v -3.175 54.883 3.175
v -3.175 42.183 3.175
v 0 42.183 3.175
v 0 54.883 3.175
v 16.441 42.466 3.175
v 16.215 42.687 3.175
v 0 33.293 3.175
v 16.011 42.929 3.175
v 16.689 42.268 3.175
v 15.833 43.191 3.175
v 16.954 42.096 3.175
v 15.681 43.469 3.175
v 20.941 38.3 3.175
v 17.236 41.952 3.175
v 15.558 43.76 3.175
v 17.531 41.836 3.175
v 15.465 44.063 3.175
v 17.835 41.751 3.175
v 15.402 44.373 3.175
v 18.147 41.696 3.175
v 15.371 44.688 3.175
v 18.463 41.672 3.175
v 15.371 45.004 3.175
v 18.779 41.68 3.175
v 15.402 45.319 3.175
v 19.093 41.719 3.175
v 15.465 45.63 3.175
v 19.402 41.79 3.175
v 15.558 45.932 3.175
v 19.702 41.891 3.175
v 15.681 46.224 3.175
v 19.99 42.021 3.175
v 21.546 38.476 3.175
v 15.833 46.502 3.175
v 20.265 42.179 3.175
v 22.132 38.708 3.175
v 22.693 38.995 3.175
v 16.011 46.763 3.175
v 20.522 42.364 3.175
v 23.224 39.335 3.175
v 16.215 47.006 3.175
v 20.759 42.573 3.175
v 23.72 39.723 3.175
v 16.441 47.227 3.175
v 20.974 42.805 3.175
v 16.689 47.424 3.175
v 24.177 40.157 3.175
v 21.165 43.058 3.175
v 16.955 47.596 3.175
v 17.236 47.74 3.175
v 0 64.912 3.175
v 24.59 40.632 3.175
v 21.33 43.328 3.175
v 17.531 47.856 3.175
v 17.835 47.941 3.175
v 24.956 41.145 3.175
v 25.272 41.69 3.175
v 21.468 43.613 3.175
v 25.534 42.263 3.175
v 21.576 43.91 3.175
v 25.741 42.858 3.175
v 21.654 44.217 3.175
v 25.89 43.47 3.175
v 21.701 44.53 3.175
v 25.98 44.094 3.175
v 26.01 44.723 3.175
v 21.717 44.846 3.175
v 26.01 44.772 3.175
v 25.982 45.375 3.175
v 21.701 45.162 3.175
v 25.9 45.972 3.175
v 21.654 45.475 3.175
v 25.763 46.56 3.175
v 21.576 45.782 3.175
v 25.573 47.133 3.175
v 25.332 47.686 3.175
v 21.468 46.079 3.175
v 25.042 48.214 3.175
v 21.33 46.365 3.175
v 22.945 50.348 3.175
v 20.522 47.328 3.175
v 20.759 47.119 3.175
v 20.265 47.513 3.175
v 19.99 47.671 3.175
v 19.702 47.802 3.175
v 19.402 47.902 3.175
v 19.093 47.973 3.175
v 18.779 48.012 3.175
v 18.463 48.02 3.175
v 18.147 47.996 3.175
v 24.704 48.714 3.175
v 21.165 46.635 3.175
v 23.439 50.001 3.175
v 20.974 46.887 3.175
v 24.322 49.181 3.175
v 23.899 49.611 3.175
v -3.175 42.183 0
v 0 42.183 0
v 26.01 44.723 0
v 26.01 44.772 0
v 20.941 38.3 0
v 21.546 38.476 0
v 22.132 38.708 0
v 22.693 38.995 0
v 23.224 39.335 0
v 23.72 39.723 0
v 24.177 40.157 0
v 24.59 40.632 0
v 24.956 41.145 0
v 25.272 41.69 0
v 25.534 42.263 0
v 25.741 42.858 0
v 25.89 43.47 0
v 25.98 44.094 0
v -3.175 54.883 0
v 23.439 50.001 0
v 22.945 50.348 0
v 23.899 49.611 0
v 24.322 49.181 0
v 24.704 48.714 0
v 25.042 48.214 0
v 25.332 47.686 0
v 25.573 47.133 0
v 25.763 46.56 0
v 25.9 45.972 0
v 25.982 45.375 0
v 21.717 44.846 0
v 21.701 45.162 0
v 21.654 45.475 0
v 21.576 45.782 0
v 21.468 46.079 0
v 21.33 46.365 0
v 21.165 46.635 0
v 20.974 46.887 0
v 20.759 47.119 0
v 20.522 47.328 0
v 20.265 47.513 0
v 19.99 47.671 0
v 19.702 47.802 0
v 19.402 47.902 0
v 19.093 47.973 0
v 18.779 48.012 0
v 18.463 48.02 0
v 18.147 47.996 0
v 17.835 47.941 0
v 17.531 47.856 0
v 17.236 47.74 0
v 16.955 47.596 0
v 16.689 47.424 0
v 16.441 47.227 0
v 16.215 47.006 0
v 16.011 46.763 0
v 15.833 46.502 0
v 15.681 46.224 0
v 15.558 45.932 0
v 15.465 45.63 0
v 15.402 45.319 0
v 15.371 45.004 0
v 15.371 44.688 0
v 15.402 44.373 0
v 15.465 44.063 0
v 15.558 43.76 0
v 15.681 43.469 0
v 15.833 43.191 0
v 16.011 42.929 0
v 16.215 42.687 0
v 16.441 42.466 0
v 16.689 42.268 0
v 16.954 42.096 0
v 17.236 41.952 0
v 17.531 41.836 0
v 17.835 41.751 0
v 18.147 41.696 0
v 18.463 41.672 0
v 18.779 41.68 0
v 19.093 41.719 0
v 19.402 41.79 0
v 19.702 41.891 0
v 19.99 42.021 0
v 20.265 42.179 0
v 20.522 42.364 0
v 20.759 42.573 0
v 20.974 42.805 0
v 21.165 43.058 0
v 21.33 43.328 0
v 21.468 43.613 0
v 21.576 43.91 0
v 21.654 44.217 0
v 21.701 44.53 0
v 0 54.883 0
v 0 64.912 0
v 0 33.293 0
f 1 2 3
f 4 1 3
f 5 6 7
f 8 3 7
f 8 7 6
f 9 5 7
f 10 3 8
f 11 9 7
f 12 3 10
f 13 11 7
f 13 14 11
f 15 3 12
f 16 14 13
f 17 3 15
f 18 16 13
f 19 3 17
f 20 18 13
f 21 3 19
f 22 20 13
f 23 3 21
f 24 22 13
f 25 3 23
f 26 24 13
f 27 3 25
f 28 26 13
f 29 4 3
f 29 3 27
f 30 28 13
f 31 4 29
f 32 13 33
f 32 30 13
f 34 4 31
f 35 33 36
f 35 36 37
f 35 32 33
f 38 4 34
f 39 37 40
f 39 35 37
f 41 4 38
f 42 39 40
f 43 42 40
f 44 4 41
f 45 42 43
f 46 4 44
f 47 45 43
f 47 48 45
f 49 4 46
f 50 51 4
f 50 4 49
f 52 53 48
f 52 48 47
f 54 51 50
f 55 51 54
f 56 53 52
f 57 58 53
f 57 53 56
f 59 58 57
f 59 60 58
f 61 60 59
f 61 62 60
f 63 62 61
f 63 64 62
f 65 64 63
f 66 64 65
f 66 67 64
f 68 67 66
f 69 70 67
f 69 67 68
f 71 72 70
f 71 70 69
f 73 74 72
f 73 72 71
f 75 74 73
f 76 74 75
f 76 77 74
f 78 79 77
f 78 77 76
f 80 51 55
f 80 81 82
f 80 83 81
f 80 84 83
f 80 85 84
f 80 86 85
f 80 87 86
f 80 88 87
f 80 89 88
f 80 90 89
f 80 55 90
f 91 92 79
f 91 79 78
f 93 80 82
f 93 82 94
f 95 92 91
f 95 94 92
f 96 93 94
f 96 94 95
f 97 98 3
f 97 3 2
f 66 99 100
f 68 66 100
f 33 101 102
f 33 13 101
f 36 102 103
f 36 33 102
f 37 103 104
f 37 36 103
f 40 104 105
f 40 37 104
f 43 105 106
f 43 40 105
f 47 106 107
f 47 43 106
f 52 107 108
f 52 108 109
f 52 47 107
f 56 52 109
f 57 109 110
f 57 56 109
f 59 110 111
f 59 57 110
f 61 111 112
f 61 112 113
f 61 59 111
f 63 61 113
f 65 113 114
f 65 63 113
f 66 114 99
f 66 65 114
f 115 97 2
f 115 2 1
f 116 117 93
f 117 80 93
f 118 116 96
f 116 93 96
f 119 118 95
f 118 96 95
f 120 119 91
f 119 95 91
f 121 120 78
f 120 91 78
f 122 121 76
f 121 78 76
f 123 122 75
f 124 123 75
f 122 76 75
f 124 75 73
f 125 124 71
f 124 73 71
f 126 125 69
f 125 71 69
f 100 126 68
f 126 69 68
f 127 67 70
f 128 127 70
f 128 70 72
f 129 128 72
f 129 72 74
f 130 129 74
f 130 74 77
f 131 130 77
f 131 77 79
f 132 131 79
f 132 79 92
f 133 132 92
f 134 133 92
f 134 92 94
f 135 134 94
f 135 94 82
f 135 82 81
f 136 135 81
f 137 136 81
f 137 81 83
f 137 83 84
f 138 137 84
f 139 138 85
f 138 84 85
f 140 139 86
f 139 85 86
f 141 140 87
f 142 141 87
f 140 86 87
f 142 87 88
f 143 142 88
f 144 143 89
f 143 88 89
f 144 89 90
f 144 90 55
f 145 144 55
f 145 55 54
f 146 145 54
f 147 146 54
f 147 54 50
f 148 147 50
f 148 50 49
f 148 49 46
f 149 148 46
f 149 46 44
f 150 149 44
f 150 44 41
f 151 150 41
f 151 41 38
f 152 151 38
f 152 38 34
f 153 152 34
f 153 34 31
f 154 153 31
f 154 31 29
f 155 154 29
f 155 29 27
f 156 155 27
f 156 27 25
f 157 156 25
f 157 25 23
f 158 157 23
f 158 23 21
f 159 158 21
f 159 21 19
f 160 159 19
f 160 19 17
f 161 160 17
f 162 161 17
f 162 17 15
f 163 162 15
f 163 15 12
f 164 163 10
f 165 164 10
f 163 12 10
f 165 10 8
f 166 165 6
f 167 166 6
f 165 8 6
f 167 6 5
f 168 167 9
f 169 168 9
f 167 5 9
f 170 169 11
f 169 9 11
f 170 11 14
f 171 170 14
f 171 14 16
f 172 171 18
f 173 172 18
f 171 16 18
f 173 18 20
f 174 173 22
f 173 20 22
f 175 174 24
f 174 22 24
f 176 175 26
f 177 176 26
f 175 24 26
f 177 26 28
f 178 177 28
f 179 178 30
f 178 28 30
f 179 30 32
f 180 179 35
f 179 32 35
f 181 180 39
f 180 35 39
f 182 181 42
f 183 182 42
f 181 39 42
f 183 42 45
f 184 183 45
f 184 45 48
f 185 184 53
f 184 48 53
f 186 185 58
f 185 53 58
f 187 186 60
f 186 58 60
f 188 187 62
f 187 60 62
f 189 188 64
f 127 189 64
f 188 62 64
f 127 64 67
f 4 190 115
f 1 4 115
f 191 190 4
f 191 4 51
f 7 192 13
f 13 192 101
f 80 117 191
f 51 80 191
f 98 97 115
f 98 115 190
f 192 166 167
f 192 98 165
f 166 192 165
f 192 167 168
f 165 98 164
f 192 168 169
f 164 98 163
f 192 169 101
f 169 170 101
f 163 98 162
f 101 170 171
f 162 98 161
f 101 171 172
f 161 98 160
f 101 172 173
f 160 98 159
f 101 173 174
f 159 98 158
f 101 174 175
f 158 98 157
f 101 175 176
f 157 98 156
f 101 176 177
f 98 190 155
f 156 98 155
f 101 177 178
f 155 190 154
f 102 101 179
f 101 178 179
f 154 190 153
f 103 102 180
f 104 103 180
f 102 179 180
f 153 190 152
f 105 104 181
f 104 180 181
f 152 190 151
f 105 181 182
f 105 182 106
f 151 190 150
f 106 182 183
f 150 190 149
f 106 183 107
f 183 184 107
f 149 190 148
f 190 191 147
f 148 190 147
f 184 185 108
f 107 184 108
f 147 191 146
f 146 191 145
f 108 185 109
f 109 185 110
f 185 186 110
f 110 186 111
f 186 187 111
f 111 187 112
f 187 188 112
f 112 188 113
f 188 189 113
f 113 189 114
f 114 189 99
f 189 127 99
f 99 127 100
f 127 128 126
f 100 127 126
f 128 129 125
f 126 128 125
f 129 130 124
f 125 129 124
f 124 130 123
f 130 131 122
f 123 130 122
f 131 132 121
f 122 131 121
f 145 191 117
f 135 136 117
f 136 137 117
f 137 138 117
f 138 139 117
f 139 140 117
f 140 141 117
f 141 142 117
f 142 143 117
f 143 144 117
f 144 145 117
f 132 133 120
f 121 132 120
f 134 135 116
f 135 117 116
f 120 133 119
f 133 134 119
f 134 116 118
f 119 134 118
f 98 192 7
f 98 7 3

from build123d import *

# Parameters (mm, degrees)
SKETCH1_W                   = 68.548183611
SKETCH1_H                   = 64.912098736
BOSS_EXTRUDE1_DEPTH         = 3.175
F_1_4_0_25_DIAMETER_HOLE1_D = 6.35
CUT_EXTRUDE1_DEPTH          = 95.459063428
FILLET1_R                   = 6.604
SKETCH5_W                   = 3.175
SKETCH5_H                   = 12.7
BOSS_EXTRUDE2_DEPTH         = 3.175


with BuildPart() as part:
    # Sketch1 → Boss-Extrude1 (new body)
    with BuildSketch(Plane.XY):
        with Locations((34.274091805, 32.456049368)):
            Rectangle(SKETCH1_W, SKETCH1_H)
    extrude(amount=BOSS_EXTRUDE1_DEPTH)

    # 1/4 (0.25) Diameter Hole1 (through all)
    with Locations(Plane(origin=(0, 0, 0), x_dir=(-1, 0, 0), z_dir=(0, 0, -1))):
        with Locations((-18.542, 44.846098736)):
            Hole(F_1_4_0_25_DIAMETER_HOLE1_D / 2)

    # Sketch4 → Cut-Extrude1 (cut, through all)
    with BuildSketch(Plane(origin=(0, 0, 0), x_dir=(-1, 0, 0), z_dir=(0, 0, -1))):
        Polygon((-26.0096, 48.402098736), (0, 64.912098736), (-68.548183611, 64.912098736), (-68.548183611, 0), (0, 0), (0, 33.293092607), (-26.0096, 39.512098736), align=None)
    extrude(amount=-CUT_EXTRUDE1_DEPTH, mode=Mode.SUBTRACT)

    # Fillet1
    fillet1_edges = [part.edges().sort_by_distance(p)[0] for p in [
        (26.0096, 39.512098736, 1.5875),
        (26.0096, 48.402098736, 1.5875),
    ]]
    fillet(fillet1_edges, radius=FILLET1_R)

    # Sketch5 → Boss-Extrude2 (add)
    with BuildSketch(Plane(origin=(0, 0, 0), x_dir=(-1, 0, 0), z_dir=(0, 0, -1))):
        with Locations((1.5875, 48.533092607)):
            Rectangle(SKETCH5_W, SKETCH5_H)
    extrude(amount=-BOSS_EXTRUDE2_DEPTH)


solid = part.part
